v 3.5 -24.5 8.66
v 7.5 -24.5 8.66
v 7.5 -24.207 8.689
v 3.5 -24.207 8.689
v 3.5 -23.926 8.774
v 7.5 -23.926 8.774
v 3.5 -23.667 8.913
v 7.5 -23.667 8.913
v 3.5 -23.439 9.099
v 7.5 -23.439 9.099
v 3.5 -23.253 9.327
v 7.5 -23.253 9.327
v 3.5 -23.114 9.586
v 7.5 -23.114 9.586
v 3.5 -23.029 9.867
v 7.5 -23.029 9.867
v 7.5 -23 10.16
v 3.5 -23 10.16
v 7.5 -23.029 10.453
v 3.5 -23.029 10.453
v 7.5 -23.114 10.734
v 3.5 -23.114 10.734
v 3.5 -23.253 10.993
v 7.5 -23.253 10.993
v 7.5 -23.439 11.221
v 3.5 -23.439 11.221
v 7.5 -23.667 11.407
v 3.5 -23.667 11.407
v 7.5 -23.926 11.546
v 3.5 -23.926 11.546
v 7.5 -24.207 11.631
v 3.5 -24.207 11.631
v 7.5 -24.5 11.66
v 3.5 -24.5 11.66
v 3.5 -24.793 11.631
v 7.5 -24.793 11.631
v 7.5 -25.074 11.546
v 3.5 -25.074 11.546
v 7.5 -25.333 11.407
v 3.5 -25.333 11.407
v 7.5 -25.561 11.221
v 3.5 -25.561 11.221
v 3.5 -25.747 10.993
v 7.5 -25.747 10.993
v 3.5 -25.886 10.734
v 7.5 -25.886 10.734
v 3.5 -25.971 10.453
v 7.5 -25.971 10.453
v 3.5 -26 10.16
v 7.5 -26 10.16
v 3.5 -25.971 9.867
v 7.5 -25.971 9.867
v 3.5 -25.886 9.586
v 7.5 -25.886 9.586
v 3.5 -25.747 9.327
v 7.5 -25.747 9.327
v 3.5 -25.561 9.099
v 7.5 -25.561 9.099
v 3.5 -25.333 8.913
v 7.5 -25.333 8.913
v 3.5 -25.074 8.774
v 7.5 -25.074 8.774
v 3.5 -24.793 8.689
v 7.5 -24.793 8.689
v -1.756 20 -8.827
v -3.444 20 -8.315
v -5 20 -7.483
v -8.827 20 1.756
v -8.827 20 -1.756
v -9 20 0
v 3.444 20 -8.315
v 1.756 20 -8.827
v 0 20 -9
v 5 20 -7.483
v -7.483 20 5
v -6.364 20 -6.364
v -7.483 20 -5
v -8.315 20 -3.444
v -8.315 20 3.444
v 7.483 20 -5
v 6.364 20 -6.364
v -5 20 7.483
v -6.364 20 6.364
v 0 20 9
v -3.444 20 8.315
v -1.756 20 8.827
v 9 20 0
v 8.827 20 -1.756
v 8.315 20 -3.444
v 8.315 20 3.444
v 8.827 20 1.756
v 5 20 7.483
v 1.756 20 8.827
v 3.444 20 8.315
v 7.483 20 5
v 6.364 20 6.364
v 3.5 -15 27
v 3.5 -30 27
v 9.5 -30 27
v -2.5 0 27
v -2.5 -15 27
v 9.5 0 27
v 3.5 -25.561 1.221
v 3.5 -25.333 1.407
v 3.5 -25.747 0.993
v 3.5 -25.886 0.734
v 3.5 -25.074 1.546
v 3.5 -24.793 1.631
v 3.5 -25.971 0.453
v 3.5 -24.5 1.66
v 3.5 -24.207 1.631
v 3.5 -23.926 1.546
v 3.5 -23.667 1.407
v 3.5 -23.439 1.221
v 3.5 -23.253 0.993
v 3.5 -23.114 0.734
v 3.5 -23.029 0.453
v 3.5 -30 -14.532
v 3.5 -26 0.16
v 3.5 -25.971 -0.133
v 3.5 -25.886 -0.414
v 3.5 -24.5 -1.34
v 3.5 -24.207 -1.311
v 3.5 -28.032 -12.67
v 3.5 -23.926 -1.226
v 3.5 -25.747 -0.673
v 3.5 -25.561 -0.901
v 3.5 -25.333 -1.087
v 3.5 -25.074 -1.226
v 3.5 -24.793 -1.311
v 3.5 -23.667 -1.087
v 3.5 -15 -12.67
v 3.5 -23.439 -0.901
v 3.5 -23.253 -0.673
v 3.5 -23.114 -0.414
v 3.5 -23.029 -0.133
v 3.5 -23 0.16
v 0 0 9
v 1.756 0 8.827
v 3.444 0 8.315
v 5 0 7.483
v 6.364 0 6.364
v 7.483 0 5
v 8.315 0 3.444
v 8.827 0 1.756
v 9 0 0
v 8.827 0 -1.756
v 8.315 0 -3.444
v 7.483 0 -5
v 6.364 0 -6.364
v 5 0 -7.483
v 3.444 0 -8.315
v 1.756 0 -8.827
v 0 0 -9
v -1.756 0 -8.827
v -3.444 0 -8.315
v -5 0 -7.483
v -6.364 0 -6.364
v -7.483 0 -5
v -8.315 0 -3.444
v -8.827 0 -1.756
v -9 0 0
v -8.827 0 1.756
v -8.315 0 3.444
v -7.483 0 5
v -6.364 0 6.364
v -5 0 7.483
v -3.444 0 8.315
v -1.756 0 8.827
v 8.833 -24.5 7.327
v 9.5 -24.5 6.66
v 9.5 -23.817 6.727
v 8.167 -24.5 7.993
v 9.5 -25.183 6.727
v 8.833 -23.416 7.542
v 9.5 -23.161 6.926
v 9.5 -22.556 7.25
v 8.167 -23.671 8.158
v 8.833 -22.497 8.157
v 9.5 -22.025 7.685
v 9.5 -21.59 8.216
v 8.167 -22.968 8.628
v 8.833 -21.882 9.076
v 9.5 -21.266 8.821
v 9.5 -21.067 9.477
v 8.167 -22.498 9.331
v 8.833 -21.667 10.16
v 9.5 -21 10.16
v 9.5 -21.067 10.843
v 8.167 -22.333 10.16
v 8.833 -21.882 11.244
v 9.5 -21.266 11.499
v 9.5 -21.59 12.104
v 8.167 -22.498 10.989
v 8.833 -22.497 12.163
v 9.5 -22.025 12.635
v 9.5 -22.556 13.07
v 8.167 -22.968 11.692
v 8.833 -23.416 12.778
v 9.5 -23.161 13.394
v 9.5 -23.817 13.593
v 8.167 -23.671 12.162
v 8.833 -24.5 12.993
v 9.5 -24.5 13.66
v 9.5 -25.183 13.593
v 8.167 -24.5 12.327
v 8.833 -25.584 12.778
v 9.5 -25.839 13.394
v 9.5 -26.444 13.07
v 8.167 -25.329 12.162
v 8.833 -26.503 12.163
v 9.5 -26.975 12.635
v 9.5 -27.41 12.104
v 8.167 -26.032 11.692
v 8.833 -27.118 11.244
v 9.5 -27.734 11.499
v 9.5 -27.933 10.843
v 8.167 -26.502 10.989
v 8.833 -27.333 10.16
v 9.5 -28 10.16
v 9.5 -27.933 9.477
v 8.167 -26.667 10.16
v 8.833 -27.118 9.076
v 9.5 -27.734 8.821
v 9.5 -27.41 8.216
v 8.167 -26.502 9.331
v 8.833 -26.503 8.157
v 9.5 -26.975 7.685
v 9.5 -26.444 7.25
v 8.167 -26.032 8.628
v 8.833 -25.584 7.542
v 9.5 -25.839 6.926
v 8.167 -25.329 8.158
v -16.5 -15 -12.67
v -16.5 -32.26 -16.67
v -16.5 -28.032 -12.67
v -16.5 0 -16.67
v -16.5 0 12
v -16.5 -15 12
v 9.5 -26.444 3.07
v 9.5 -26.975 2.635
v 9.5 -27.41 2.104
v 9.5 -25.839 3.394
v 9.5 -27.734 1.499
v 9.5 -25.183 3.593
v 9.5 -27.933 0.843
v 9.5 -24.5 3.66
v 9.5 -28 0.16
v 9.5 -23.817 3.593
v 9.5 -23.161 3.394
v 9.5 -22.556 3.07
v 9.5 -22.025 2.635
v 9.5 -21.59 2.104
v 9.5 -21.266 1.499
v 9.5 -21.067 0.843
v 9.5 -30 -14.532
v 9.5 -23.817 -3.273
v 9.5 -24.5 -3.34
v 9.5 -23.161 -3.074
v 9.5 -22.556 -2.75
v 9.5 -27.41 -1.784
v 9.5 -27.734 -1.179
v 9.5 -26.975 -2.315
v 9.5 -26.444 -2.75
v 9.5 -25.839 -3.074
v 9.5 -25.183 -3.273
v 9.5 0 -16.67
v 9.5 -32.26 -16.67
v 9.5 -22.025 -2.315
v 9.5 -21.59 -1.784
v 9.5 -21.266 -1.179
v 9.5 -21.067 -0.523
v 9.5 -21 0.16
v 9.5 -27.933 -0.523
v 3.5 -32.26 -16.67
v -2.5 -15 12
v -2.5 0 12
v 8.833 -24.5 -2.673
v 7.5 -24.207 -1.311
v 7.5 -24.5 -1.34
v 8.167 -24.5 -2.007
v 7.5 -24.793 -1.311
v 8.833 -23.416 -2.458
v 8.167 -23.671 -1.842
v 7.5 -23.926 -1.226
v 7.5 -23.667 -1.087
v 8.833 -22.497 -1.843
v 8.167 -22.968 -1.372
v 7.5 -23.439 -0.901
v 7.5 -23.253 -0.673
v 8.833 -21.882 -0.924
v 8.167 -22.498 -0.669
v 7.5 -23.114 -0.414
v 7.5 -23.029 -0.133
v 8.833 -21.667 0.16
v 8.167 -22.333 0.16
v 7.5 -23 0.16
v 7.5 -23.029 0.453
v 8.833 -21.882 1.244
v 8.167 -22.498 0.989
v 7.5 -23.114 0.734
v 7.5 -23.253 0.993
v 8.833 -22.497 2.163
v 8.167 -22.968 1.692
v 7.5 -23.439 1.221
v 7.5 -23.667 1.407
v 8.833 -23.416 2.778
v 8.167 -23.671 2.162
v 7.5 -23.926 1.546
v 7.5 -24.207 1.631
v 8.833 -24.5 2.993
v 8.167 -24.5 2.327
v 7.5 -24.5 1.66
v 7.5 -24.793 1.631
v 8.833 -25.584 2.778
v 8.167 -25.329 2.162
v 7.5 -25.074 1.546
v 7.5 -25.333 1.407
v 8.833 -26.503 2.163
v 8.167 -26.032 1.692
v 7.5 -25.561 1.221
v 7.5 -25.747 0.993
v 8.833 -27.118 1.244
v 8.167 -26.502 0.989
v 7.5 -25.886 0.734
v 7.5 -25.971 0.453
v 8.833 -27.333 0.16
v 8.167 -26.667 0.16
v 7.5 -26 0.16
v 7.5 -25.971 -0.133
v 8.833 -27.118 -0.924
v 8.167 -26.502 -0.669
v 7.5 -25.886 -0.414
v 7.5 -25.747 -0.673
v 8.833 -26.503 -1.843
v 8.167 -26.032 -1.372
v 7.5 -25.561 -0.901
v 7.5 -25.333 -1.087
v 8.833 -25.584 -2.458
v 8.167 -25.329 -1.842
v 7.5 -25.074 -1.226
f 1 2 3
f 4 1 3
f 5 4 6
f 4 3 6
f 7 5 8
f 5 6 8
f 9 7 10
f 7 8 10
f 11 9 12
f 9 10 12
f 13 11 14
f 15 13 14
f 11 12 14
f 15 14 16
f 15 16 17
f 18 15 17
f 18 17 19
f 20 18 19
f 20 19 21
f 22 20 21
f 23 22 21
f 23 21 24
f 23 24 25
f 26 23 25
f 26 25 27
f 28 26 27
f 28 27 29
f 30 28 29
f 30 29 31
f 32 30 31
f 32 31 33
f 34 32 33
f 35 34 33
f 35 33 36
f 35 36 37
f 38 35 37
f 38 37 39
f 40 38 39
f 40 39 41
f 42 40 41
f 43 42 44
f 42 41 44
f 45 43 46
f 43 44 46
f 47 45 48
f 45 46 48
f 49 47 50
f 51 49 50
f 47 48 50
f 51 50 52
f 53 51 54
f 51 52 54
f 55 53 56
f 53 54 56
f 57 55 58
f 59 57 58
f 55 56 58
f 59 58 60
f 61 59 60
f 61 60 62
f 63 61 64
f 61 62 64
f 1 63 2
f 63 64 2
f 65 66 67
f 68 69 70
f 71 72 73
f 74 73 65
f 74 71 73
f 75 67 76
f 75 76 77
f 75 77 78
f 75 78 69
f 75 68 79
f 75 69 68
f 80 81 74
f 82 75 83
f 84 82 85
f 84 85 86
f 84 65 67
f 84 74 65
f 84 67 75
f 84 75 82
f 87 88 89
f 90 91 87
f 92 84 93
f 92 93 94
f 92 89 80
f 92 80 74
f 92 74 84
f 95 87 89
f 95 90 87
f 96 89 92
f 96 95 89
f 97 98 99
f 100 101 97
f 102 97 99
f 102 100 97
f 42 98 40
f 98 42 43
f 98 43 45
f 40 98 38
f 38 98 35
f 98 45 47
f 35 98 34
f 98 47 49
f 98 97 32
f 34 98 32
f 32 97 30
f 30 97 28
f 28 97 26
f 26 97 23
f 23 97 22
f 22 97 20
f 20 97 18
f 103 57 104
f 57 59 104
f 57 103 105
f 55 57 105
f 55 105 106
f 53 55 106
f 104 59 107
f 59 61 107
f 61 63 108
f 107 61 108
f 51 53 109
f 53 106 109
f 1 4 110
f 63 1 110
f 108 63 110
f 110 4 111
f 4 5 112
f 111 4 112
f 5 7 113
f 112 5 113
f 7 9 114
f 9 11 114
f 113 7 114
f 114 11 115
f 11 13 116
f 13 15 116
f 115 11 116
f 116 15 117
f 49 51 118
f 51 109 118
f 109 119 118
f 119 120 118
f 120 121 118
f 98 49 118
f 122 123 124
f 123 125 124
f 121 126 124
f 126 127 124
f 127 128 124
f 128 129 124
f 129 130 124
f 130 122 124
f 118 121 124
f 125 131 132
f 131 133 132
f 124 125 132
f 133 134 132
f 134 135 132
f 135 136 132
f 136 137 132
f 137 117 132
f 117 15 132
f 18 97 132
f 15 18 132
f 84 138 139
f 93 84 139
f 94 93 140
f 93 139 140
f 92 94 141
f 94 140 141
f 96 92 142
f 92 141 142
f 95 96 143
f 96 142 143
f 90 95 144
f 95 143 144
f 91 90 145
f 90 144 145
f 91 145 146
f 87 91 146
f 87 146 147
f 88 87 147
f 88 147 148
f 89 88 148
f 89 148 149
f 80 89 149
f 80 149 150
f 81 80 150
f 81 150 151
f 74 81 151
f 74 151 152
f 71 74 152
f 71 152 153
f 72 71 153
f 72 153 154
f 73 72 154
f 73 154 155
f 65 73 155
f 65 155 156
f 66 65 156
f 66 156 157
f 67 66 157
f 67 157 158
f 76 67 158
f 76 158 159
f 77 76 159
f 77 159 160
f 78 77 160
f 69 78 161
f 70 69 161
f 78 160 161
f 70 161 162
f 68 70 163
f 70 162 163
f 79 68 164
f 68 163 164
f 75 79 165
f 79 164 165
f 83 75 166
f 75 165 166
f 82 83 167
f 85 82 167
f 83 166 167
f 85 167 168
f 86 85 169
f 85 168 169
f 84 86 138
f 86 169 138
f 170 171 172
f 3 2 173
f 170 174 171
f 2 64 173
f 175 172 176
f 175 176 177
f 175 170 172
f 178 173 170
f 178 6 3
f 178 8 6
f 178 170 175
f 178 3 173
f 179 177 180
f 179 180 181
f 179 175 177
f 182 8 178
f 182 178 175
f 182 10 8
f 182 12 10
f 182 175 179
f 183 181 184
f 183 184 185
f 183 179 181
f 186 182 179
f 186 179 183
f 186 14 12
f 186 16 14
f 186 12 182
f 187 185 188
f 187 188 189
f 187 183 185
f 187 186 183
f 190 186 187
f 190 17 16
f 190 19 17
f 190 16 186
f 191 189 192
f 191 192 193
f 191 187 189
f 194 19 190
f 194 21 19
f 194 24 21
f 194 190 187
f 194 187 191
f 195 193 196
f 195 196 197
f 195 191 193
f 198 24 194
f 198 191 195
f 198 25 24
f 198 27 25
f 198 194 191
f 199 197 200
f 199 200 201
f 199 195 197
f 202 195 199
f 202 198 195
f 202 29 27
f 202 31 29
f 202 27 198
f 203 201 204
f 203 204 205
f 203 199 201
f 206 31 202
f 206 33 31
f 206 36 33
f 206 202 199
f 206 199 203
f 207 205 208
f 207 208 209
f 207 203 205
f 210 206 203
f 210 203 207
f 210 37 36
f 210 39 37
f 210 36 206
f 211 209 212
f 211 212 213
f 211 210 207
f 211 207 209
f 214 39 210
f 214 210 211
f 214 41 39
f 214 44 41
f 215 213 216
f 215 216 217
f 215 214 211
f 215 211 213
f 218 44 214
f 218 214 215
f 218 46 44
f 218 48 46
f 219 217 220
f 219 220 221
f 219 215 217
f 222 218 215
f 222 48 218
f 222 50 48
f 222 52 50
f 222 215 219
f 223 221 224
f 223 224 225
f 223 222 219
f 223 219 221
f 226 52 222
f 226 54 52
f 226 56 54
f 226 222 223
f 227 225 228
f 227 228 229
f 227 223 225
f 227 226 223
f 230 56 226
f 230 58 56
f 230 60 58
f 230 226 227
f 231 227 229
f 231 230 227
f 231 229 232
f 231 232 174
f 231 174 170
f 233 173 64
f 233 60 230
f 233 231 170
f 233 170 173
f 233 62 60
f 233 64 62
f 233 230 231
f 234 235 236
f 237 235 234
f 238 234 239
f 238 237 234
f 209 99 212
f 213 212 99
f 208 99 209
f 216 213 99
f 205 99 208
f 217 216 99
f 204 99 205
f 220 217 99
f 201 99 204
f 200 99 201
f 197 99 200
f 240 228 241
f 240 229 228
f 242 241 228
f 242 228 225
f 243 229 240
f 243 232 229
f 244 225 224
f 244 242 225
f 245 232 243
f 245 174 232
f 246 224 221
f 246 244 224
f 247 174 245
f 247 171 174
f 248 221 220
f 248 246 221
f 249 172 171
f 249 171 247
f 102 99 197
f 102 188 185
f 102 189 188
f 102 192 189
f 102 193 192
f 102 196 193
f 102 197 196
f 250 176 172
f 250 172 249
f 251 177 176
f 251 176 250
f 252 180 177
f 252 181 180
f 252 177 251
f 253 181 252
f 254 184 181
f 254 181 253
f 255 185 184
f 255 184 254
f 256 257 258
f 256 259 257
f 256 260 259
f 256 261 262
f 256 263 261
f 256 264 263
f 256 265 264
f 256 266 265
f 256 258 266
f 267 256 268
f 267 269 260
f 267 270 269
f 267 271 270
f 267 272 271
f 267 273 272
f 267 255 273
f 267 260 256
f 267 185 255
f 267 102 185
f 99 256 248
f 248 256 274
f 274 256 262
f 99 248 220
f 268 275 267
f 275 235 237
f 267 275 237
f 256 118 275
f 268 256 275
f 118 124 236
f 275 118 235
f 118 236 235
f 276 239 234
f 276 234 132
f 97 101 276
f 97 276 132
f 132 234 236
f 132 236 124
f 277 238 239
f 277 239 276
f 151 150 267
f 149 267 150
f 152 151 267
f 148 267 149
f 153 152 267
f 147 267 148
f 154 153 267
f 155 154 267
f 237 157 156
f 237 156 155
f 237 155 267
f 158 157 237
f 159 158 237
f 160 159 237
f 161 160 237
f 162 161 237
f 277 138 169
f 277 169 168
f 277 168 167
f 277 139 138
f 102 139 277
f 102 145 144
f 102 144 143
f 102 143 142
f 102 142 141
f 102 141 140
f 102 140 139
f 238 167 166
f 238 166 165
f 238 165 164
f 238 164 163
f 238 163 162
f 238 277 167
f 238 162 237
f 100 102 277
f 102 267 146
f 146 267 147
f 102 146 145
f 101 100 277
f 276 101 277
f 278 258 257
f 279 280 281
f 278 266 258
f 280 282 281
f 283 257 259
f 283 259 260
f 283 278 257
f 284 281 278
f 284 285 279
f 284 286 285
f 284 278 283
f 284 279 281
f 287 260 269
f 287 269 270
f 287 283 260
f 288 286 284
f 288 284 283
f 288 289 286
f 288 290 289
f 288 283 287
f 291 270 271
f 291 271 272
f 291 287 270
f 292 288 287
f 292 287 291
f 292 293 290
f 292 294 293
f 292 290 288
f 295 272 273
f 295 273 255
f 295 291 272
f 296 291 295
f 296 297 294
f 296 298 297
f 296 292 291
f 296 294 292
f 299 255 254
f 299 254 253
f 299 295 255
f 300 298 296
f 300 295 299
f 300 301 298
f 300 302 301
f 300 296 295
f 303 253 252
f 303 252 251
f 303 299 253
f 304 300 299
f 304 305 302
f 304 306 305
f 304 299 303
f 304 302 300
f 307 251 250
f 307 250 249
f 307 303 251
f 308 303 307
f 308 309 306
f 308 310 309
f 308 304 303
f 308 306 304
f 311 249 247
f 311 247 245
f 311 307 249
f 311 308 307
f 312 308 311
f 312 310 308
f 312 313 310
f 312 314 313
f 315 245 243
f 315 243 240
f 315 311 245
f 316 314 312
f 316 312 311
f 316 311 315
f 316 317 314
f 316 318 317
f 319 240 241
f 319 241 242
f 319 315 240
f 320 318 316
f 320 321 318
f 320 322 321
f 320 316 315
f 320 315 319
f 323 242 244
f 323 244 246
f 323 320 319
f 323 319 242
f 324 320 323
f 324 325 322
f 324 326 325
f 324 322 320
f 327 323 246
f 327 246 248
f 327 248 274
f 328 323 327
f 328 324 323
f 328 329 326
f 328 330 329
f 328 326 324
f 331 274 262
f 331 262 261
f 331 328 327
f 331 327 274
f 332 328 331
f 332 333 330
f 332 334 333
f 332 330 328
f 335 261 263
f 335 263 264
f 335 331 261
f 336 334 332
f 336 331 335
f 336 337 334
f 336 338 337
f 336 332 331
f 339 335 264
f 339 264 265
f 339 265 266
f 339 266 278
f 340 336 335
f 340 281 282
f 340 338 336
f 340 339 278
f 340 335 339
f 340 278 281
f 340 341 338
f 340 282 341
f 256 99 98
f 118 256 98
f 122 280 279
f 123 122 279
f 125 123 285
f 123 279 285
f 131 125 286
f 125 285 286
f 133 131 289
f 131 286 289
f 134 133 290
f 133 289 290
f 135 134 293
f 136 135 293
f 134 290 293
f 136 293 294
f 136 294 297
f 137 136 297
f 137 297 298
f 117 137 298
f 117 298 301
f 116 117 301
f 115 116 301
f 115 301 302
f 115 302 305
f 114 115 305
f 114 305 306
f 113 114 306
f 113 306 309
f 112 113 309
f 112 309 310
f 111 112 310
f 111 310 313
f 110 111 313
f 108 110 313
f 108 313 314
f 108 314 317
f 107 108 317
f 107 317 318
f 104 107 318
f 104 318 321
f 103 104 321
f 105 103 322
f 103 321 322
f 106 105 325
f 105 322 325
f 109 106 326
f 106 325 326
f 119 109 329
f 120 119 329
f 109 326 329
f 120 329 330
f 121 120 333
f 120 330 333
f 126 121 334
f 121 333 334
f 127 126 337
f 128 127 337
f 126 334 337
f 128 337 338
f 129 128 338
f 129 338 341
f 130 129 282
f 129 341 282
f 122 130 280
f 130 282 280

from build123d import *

# Parameters (mm, degrees)
SKETCH_1_R          = 9
EXTRUDE_1_DEPTH     = 20
SKETCH_2_W          = 20
SKETCH_2_H          = 43.67
EXTRUDE_2_DEPTH     = 15
SKETCH_3_W          = 14
SKETCH_3_H          = 15
CUT_EXTRUDE_1_DEPTH = 38.433273968
SKETCH_4_W          = 20
SKETCH_4_H          = 4
EXTRUDE_3_DEPTH     = 17.26
CUT_EXTRUDE_2_DEPTH = 50.193064552
EXTRUDE_4_DEPTH     = 30
SKETCH_7_R          = 1.5
CUT_EXTRUDE_3_DEPTH = 50.454095887
EXTRUDE_5_DEPTH     = 6
CHAMFER_1_SIZE      = 2


with BuildPart() as part:
    # Эскиз1 → Бобышка-Вытянуть1 (new body)
    with BuildSketch(Plane(origin=(0, 0, 0), x_dir=(1, 0, 0), z_dir=(0, 1, 0))):
        with Locations(Location((0, 0, 0), (0, 0, 270))):
            Circle(SKETCH_1_R)
    extrude(amount=EXTRUDE_1_DEPTH)

    # Эскиз2 → Бобышка-Вытянуть2 (add)
    with BuildSketch(Plane.XZ):
        with Locations((-6.5, 5.165)):
            Rectangle(SKETCH_2_W, SKETCH_2_H)
    extrude(amount=EXTRUDE_2_DEPTH)

    # Эскиз3 → Вырез-Вытянуть1 (cut, through all)
    with BuildSketch(Plane(origin=(0, 0, 0), x_dir=(1, 0, 0), z_dir=(0, 1, 0))):
        with Locations((-9.5, -19.5)):
            Rectangle(SKETCH_3_W, SKETCH_3_H)
    extrude(amount=-CUT_EXTRUDE_1_DEPTH, mode=Mode.SUBTRACT)

    # Эскиз4 → Бобышка-Вытянуть3 (add)
    with BuildSketch(Plane.XZ.offset(15)):
        with Locations((-6.5, -14.67)):
            Rectangle(SKETCH_4_W, SKETCH_4_H)
    extrude(amount=EXTRUDE_3_DEPTH)

    # Эскиз5 → Вырез-Вытянуть2 (cut, through all)
    with BuildSketch(Plane.ZY.offset(16.5)):
        Polygon((-12.67, -32.26), (-12.67, -28.031597138), (-16.67, -32.26), align=None)
    extrude(amount=-CUT_EXTRUDE_2_DEPTH, mode=Mode.SUBTRACT)

    # Эскиз6 → Бобышка-Вытянуть4 (add)
    with BuildSketch(Plane.XZ):
        Polygon((3.5, 8.291561976), (3.5, 27), (9.5, 27), (9.5, -16.67), (3.5, -16.67), (3.5, -8.291561976), align=None)
    extrude(amount=EXTRUDE_4_DEPTH)

    # Эскиз7 → Вырез-Вытянуть3 (cut, through all)
    with BuildSketch(Plane(origin=(9.5, 0, 0), x_dir=(0, 0, -1), z_dir=(1, 0, 0))):
        with Locations((-10.16, -24.5)):
            Circle(SKETCH_7_R)
        with Locations((-0.16, -24.5)):
            Circle(SKETCH_7_R)
    extrude(amount=-CUT_EXTRUDE_3_DEPTH, mode=Mode.SUBTRACT)

    # Эскиз8 → Бобышка-Вытянуть5 (add)
    with BuildSketch(Plane(origin=(3.5, 0, 0), x_dir=(0, 0, -1), z_dir=(1, 0, 0))):
        Polygon((16.67, -30), (14.532076937, -30), (16.67, -32.26), align=None)
    extrude(amount=EXTRUDE_5_DEPTH)

    # Фаска1
    chamfer_1_edges = [part.edges().sort_by_distance(p)[0] for p in [
        (9.5, -24.5, 11.66),
        (9.5, -24.5, 1.66),
    ]]
    chamfer(chamfer_1_edges, length=CHAMFER_1_SIZE)


solid = part.part
